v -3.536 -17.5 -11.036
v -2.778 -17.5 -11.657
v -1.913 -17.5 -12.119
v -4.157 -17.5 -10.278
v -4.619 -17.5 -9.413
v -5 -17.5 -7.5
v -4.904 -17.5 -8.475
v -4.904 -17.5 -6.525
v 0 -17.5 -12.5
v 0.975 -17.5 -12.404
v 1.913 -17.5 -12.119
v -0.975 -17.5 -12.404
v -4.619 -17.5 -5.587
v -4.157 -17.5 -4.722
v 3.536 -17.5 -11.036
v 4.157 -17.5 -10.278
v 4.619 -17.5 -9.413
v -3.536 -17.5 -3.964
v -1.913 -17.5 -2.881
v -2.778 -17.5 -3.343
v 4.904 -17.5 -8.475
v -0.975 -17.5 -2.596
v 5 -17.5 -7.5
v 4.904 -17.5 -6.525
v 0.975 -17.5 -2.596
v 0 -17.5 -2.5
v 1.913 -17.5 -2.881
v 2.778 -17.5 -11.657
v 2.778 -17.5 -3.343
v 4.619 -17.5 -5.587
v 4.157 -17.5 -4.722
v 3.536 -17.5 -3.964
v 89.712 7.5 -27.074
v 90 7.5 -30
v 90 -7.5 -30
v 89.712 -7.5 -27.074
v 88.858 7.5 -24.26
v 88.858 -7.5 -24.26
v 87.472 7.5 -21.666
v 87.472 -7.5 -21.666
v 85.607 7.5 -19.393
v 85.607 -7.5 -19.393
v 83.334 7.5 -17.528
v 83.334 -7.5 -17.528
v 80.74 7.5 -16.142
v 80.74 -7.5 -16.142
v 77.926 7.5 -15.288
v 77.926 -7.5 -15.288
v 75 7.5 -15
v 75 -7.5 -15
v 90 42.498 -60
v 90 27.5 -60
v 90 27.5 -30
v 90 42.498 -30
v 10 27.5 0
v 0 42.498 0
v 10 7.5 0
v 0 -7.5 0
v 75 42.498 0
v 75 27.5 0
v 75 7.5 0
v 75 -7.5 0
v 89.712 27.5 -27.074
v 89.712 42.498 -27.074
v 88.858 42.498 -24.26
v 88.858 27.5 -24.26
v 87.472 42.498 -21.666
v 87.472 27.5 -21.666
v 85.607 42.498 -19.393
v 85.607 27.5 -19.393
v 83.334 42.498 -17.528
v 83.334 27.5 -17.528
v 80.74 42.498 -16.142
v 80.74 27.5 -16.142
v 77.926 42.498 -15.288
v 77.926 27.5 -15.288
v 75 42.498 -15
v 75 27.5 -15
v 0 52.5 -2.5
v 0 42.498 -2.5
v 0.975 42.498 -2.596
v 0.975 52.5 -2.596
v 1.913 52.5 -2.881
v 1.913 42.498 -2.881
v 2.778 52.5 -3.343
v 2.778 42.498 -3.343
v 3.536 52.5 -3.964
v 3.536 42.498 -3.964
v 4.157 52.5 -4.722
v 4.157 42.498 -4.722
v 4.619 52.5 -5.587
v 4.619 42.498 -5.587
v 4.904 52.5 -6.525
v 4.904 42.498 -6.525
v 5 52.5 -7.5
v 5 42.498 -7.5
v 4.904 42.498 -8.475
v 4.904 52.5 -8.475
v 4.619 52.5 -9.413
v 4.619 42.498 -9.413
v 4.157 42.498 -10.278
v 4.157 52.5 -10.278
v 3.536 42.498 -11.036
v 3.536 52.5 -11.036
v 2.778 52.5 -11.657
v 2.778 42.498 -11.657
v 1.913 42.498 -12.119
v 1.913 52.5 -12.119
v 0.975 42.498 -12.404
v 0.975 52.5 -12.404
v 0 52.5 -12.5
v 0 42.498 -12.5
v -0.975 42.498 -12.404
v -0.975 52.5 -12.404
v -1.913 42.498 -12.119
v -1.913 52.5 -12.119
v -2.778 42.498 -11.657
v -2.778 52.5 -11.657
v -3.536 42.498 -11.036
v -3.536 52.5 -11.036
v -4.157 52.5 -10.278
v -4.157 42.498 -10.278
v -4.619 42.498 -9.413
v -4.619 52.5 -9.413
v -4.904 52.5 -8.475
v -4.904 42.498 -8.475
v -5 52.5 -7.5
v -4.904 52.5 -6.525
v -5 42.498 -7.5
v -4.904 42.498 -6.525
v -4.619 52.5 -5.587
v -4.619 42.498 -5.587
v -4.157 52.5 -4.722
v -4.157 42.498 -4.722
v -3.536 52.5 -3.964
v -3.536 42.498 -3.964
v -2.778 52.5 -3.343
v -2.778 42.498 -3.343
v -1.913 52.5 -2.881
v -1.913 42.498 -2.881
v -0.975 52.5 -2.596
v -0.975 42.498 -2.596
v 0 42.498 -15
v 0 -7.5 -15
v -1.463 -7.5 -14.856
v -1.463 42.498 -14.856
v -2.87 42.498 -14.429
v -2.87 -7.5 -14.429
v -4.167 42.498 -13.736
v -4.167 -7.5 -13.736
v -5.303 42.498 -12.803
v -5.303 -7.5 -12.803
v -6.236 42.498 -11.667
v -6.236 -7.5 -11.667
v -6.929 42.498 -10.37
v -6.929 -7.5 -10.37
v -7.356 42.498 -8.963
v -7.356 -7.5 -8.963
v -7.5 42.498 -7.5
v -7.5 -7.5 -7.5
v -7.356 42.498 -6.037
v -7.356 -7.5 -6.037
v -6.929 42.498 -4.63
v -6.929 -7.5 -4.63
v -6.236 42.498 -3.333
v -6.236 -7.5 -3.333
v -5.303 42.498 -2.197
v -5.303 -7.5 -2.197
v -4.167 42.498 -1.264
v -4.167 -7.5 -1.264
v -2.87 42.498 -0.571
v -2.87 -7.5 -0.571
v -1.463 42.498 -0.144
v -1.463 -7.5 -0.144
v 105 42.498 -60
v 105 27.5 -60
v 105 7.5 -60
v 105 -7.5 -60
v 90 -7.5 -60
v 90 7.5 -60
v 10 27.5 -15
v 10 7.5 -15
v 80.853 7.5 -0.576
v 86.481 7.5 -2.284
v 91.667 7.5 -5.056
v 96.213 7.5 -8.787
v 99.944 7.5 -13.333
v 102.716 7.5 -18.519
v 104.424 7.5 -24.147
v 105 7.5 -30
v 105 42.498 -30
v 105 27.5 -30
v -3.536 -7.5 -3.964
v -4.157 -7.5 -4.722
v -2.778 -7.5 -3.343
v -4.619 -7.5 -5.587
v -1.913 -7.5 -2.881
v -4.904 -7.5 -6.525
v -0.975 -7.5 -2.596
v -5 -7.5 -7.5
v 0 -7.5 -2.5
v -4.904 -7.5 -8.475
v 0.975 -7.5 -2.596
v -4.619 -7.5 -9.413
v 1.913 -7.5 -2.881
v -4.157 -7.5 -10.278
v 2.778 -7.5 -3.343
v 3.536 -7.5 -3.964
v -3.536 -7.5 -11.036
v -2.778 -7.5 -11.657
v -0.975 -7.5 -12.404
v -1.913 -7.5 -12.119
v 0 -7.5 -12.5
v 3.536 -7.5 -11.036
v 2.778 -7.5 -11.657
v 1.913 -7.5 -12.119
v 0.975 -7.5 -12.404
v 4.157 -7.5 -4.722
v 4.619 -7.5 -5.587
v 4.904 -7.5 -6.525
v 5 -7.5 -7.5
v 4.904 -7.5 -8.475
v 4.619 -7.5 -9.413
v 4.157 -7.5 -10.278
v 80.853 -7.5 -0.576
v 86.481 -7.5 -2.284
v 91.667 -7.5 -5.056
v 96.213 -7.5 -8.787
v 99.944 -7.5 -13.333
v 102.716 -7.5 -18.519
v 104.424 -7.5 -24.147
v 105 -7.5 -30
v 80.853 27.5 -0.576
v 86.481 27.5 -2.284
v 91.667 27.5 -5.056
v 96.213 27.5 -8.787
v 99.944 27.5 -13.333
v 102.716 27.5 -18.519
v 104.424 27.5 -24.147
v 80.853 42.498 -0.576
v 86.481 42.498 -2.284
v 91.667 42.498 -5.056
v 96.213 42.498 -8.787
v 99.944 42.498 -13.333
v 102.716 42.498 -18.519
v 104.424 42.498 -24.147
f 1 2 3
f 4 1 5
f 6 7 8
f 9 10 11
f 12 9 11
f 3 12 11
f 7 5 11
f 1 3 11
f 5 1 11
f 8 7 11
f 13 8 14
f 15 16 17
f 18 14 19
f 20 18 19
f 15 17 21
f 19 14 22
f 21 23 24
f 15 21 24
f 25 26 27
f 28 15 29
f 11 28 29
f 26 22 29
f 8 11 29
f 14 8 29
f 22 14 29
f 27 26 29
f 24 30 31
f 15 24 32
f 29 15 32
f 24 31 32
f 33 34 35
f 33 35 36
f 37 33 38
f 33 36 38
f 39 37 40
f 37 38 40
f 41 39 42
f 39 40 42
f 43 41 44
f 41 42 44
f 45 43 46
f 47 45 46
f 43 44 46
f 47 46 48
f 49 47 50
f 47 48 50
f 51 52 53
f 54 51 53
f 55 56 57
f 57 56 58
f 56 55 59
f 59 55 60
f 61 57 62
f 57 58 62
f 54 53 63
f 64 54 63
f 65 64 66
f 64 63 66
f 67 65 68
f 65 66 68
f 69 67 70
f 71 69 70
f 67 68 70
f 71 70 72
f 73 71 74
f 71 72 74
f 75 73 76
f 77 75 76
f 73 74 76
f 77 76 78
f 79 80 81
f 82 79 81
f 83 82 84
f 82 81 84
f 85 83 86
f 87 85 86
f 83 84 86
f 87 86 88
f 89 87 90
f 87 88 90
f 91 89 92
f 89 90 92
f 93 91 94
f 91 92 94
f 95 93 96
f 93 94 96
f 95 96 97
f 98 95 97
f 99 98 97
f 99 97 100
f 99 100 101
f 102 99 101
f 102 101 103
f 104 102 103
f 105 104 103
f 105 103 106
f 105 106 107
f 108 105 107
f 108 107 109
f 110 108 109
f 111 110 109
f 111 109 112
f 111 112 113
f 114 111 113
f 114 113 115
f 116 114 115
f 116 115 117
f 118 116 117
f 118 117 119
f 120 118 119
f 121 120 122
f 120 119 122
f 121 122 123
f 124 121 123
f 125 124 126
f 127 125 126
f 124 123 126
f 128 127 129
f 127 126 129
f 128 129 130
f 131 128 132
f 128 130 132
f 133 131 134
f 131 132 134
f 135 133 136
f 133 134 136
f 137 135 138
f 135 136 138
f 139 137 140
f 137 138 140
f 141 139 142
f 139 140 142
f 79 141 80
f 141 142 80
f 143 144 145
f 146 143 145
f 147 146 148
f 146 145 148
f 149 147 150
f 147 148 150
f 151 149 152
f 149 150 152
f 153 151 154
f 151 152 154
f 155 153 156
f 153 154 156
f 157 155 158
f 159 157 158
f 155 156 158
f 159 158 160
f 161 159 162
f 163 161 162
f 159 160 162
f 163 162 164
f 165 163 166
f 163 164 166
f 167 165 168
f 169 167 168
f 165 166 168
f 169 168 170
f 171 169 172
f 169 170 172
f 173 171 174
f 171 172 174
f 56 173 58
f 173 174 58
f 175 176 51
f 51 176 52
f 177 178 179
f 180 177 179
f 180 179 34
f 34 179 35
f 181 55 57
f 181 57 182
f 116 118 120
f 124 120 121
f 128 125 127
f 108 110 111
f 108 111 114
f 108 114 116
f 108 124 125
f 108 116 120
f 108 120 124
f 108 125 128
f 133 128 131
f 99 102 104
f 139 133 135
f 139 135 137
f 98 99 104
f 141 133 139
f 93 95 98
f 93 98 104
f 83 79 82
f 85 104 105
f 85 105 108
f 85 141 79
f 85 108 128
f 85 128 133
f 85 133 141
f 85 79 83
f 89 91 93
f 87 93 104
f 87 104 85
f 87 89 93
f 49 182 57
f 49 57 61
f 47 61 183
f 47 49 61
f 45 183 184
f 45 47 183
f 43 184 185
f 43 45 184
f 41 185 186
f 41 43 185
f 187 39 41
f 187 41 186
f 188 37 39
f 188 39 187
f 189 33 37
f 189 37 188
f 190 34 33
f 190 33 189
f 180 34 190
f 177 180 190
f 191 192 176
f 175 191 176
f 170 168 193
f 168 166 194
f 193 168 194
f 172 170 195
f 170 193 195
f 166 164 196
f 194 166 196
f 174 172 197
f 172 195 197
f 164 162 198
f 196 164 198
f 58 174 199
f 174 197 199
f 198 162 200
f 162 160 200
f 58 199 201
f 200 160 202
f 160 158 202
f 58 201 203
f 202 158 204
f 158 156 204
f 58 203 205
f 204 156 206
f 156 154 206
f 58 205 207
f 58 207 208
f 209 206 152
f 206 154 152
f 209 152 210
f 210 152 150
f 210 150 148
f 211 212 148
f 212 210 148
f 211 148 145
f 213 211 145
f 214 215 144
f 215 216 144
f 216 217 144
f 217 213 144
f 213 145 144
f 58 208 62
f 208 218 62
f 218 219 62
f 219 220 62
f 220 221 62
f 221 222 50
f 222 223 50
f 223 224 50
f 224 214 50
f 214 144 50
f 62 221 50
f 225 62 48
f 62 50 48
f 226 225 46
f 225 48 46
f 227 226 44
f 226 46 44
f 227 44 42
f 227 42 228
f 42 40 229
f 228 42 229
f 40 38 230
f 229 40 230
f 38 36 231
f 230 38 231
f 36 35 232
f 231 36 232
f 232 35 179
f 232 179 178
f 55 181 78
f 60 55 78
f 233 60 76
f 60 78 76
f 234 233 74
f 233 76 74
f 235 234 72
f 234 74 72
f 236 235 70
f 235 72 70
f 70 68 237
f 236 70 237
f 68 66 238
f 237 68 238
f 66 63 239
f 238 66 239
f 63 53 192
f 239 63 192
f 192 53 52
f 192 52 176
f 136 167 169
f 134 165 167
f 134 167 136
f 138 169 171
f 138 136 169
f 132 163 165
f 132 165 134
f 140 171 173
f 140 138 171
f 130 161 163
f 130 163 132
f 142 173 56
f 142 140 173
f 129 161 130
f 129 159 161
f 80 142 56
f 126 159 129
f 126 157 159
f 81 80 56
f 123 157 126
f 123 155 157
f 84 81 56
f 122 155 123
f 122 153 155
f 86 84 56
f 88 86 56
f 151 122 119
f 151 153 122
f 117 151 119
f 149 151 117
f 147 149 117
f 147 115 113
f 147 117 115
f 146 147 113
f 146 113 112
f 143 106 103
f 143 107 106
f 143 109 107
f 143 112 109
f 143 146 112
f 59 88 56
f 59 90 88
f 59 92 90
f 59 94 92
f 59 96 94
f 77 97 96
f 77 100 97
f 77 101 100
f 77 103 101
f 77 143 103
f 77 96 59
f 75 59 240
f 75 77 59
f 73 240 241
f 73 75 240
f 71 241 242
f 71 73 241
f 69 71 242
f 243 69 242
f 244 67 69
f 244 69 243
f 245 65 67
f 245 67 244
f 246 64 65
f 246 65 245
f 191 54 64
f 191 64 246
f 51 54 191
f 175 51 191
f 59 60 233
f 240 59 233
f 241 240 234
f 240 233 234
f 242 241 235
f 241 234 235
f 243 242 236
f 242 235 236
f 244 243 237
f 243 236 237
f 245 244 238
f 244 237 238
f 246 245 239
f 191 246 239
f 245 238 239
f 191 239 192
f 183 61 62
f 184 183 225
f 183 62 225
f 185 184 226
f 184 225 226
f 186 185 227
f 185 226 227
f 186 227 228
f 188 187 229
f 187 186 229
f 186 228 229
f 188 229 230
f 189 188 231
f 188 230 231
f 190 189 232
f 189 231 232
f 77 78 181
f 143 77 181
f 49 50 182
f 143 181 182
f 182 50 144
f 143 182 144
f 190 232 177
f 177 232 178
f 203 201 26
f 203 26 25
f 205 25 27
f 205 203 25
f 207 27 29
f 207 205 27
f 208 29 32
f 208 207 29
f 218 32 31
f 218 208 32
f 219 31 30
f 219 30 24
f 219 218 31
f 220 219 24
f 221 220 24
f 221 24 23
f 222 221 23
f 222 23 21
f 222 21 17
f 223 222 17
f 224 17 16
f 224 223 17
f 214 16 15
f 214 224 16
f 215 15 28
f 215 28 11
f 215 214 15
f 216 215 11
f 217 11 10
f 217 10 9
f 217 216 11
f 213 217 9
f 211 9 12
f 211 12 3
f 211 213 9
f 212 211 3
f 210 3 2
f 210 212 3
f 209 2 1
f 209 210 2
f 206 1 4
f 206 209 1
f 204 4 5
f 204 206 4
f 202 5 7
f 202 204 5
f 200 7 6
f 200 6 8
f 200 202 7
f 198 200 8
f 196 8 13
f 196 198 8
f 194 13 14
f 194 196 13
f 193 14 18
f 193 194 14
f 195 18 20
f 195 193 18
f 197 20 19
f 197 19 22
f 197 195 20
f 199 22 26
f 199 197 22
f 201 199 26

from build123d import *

# Parameters (mm, degrees)
EXTRUDE_1_DEPTH      = 42.498268572
EXTRUDE_1_DEPTH_BACK = 7.5
SKETCH_1_R           = 5
SKETCH_2_R           = 5
EXTRUDE_2_DEPTH      = 17.5
SKETCH_3_R           = 5
EXTRUDE_3_DEPTH      = 52.5
SKETCH_4_W           = 107.730205786
SKETCH_4_H           = 74.358975683
CUT_EXTRUDE_1_DEPTH  = 10


with BuildPart() as part:
    # 草图1 → 凸台-拉伸1 (new, two sides: drawn at the far end of the back side and taken through both)
    with BuildSketch(Plane(origin=(0, 0, 0), x_dir=(1, 0, 0), z_dir=(0, 1, 0)).offset(-EXTRUDE_1_DEPTH_BACK)):
        with BuildLine():
            Line((0, 0), (75, 0))
            ThreePointArc((75, 0), (96.213203436, 8.786796564), (105, 30))
            Line((105, 30), (105, 60))
            Line((105, 60), (90, 60))
            Line((90, 60), (90, 30))
            ThreePointArc((90, 30), (85.606601718, 19.393398282), (75, 15))
            Line((75, 15), (0, 15))
            ThreePointArc((0, 15), (-7.5, 7.5), (0, 0))
        make_face()
        with Locations(Location((0, 7.5, 0), (0, 0, 270))):
            Circle(SKETCH_1_R, mode=Mode.SUBTRACT)
    extrude(amount=EXTRUDE_1_DEPTH + EXTRUDE_1_DEPTH_BACK)

    # 草图2 → 凸台-拉伸2 (add, symmetric)
    with BuildSketch(Plane(origin=(0, 0, 0), x_dir=(1, 0, 0), z_dir=(0, 1, 0))):
        with Locations(Location((0, 7.5, 0), (0, 0, 270))):
            Circle(SKETCH_2_R)
    extrude(amount=EXTRUDE_2_DEPTH, both=True)

    # 草图3 → 凸台-拉伸3 (add)
    with BuildSketch(Plane(origin=(0, 0, 0), x_dir=(1, 0, 0), z_dir=(0, 1, 0))):
        with Locations(Location((0, 7.5, 0), (0, 0, 270))):
            Circle(SKETCH_3_R)
    extrude(amount=EXTRUDE_3_DEPTH)

    # 草图4 → 切除-拉伸1 (cut, symmetric)
    with BuildSketch(Plane(origin=(0, 17.5, 0), x_dir=(1, 0, 0), z_dir=(0, 1, 0))):
        with Locations((63.865102893, 35.82913053)):
            Rectangle(SKETCH_4_W, SKETCH_4_H)
    extrude(amount=CUT_EXTRUDE_1_DEPTH, both=True, mode=Mode.SUBTRACT)


solid = part.part
